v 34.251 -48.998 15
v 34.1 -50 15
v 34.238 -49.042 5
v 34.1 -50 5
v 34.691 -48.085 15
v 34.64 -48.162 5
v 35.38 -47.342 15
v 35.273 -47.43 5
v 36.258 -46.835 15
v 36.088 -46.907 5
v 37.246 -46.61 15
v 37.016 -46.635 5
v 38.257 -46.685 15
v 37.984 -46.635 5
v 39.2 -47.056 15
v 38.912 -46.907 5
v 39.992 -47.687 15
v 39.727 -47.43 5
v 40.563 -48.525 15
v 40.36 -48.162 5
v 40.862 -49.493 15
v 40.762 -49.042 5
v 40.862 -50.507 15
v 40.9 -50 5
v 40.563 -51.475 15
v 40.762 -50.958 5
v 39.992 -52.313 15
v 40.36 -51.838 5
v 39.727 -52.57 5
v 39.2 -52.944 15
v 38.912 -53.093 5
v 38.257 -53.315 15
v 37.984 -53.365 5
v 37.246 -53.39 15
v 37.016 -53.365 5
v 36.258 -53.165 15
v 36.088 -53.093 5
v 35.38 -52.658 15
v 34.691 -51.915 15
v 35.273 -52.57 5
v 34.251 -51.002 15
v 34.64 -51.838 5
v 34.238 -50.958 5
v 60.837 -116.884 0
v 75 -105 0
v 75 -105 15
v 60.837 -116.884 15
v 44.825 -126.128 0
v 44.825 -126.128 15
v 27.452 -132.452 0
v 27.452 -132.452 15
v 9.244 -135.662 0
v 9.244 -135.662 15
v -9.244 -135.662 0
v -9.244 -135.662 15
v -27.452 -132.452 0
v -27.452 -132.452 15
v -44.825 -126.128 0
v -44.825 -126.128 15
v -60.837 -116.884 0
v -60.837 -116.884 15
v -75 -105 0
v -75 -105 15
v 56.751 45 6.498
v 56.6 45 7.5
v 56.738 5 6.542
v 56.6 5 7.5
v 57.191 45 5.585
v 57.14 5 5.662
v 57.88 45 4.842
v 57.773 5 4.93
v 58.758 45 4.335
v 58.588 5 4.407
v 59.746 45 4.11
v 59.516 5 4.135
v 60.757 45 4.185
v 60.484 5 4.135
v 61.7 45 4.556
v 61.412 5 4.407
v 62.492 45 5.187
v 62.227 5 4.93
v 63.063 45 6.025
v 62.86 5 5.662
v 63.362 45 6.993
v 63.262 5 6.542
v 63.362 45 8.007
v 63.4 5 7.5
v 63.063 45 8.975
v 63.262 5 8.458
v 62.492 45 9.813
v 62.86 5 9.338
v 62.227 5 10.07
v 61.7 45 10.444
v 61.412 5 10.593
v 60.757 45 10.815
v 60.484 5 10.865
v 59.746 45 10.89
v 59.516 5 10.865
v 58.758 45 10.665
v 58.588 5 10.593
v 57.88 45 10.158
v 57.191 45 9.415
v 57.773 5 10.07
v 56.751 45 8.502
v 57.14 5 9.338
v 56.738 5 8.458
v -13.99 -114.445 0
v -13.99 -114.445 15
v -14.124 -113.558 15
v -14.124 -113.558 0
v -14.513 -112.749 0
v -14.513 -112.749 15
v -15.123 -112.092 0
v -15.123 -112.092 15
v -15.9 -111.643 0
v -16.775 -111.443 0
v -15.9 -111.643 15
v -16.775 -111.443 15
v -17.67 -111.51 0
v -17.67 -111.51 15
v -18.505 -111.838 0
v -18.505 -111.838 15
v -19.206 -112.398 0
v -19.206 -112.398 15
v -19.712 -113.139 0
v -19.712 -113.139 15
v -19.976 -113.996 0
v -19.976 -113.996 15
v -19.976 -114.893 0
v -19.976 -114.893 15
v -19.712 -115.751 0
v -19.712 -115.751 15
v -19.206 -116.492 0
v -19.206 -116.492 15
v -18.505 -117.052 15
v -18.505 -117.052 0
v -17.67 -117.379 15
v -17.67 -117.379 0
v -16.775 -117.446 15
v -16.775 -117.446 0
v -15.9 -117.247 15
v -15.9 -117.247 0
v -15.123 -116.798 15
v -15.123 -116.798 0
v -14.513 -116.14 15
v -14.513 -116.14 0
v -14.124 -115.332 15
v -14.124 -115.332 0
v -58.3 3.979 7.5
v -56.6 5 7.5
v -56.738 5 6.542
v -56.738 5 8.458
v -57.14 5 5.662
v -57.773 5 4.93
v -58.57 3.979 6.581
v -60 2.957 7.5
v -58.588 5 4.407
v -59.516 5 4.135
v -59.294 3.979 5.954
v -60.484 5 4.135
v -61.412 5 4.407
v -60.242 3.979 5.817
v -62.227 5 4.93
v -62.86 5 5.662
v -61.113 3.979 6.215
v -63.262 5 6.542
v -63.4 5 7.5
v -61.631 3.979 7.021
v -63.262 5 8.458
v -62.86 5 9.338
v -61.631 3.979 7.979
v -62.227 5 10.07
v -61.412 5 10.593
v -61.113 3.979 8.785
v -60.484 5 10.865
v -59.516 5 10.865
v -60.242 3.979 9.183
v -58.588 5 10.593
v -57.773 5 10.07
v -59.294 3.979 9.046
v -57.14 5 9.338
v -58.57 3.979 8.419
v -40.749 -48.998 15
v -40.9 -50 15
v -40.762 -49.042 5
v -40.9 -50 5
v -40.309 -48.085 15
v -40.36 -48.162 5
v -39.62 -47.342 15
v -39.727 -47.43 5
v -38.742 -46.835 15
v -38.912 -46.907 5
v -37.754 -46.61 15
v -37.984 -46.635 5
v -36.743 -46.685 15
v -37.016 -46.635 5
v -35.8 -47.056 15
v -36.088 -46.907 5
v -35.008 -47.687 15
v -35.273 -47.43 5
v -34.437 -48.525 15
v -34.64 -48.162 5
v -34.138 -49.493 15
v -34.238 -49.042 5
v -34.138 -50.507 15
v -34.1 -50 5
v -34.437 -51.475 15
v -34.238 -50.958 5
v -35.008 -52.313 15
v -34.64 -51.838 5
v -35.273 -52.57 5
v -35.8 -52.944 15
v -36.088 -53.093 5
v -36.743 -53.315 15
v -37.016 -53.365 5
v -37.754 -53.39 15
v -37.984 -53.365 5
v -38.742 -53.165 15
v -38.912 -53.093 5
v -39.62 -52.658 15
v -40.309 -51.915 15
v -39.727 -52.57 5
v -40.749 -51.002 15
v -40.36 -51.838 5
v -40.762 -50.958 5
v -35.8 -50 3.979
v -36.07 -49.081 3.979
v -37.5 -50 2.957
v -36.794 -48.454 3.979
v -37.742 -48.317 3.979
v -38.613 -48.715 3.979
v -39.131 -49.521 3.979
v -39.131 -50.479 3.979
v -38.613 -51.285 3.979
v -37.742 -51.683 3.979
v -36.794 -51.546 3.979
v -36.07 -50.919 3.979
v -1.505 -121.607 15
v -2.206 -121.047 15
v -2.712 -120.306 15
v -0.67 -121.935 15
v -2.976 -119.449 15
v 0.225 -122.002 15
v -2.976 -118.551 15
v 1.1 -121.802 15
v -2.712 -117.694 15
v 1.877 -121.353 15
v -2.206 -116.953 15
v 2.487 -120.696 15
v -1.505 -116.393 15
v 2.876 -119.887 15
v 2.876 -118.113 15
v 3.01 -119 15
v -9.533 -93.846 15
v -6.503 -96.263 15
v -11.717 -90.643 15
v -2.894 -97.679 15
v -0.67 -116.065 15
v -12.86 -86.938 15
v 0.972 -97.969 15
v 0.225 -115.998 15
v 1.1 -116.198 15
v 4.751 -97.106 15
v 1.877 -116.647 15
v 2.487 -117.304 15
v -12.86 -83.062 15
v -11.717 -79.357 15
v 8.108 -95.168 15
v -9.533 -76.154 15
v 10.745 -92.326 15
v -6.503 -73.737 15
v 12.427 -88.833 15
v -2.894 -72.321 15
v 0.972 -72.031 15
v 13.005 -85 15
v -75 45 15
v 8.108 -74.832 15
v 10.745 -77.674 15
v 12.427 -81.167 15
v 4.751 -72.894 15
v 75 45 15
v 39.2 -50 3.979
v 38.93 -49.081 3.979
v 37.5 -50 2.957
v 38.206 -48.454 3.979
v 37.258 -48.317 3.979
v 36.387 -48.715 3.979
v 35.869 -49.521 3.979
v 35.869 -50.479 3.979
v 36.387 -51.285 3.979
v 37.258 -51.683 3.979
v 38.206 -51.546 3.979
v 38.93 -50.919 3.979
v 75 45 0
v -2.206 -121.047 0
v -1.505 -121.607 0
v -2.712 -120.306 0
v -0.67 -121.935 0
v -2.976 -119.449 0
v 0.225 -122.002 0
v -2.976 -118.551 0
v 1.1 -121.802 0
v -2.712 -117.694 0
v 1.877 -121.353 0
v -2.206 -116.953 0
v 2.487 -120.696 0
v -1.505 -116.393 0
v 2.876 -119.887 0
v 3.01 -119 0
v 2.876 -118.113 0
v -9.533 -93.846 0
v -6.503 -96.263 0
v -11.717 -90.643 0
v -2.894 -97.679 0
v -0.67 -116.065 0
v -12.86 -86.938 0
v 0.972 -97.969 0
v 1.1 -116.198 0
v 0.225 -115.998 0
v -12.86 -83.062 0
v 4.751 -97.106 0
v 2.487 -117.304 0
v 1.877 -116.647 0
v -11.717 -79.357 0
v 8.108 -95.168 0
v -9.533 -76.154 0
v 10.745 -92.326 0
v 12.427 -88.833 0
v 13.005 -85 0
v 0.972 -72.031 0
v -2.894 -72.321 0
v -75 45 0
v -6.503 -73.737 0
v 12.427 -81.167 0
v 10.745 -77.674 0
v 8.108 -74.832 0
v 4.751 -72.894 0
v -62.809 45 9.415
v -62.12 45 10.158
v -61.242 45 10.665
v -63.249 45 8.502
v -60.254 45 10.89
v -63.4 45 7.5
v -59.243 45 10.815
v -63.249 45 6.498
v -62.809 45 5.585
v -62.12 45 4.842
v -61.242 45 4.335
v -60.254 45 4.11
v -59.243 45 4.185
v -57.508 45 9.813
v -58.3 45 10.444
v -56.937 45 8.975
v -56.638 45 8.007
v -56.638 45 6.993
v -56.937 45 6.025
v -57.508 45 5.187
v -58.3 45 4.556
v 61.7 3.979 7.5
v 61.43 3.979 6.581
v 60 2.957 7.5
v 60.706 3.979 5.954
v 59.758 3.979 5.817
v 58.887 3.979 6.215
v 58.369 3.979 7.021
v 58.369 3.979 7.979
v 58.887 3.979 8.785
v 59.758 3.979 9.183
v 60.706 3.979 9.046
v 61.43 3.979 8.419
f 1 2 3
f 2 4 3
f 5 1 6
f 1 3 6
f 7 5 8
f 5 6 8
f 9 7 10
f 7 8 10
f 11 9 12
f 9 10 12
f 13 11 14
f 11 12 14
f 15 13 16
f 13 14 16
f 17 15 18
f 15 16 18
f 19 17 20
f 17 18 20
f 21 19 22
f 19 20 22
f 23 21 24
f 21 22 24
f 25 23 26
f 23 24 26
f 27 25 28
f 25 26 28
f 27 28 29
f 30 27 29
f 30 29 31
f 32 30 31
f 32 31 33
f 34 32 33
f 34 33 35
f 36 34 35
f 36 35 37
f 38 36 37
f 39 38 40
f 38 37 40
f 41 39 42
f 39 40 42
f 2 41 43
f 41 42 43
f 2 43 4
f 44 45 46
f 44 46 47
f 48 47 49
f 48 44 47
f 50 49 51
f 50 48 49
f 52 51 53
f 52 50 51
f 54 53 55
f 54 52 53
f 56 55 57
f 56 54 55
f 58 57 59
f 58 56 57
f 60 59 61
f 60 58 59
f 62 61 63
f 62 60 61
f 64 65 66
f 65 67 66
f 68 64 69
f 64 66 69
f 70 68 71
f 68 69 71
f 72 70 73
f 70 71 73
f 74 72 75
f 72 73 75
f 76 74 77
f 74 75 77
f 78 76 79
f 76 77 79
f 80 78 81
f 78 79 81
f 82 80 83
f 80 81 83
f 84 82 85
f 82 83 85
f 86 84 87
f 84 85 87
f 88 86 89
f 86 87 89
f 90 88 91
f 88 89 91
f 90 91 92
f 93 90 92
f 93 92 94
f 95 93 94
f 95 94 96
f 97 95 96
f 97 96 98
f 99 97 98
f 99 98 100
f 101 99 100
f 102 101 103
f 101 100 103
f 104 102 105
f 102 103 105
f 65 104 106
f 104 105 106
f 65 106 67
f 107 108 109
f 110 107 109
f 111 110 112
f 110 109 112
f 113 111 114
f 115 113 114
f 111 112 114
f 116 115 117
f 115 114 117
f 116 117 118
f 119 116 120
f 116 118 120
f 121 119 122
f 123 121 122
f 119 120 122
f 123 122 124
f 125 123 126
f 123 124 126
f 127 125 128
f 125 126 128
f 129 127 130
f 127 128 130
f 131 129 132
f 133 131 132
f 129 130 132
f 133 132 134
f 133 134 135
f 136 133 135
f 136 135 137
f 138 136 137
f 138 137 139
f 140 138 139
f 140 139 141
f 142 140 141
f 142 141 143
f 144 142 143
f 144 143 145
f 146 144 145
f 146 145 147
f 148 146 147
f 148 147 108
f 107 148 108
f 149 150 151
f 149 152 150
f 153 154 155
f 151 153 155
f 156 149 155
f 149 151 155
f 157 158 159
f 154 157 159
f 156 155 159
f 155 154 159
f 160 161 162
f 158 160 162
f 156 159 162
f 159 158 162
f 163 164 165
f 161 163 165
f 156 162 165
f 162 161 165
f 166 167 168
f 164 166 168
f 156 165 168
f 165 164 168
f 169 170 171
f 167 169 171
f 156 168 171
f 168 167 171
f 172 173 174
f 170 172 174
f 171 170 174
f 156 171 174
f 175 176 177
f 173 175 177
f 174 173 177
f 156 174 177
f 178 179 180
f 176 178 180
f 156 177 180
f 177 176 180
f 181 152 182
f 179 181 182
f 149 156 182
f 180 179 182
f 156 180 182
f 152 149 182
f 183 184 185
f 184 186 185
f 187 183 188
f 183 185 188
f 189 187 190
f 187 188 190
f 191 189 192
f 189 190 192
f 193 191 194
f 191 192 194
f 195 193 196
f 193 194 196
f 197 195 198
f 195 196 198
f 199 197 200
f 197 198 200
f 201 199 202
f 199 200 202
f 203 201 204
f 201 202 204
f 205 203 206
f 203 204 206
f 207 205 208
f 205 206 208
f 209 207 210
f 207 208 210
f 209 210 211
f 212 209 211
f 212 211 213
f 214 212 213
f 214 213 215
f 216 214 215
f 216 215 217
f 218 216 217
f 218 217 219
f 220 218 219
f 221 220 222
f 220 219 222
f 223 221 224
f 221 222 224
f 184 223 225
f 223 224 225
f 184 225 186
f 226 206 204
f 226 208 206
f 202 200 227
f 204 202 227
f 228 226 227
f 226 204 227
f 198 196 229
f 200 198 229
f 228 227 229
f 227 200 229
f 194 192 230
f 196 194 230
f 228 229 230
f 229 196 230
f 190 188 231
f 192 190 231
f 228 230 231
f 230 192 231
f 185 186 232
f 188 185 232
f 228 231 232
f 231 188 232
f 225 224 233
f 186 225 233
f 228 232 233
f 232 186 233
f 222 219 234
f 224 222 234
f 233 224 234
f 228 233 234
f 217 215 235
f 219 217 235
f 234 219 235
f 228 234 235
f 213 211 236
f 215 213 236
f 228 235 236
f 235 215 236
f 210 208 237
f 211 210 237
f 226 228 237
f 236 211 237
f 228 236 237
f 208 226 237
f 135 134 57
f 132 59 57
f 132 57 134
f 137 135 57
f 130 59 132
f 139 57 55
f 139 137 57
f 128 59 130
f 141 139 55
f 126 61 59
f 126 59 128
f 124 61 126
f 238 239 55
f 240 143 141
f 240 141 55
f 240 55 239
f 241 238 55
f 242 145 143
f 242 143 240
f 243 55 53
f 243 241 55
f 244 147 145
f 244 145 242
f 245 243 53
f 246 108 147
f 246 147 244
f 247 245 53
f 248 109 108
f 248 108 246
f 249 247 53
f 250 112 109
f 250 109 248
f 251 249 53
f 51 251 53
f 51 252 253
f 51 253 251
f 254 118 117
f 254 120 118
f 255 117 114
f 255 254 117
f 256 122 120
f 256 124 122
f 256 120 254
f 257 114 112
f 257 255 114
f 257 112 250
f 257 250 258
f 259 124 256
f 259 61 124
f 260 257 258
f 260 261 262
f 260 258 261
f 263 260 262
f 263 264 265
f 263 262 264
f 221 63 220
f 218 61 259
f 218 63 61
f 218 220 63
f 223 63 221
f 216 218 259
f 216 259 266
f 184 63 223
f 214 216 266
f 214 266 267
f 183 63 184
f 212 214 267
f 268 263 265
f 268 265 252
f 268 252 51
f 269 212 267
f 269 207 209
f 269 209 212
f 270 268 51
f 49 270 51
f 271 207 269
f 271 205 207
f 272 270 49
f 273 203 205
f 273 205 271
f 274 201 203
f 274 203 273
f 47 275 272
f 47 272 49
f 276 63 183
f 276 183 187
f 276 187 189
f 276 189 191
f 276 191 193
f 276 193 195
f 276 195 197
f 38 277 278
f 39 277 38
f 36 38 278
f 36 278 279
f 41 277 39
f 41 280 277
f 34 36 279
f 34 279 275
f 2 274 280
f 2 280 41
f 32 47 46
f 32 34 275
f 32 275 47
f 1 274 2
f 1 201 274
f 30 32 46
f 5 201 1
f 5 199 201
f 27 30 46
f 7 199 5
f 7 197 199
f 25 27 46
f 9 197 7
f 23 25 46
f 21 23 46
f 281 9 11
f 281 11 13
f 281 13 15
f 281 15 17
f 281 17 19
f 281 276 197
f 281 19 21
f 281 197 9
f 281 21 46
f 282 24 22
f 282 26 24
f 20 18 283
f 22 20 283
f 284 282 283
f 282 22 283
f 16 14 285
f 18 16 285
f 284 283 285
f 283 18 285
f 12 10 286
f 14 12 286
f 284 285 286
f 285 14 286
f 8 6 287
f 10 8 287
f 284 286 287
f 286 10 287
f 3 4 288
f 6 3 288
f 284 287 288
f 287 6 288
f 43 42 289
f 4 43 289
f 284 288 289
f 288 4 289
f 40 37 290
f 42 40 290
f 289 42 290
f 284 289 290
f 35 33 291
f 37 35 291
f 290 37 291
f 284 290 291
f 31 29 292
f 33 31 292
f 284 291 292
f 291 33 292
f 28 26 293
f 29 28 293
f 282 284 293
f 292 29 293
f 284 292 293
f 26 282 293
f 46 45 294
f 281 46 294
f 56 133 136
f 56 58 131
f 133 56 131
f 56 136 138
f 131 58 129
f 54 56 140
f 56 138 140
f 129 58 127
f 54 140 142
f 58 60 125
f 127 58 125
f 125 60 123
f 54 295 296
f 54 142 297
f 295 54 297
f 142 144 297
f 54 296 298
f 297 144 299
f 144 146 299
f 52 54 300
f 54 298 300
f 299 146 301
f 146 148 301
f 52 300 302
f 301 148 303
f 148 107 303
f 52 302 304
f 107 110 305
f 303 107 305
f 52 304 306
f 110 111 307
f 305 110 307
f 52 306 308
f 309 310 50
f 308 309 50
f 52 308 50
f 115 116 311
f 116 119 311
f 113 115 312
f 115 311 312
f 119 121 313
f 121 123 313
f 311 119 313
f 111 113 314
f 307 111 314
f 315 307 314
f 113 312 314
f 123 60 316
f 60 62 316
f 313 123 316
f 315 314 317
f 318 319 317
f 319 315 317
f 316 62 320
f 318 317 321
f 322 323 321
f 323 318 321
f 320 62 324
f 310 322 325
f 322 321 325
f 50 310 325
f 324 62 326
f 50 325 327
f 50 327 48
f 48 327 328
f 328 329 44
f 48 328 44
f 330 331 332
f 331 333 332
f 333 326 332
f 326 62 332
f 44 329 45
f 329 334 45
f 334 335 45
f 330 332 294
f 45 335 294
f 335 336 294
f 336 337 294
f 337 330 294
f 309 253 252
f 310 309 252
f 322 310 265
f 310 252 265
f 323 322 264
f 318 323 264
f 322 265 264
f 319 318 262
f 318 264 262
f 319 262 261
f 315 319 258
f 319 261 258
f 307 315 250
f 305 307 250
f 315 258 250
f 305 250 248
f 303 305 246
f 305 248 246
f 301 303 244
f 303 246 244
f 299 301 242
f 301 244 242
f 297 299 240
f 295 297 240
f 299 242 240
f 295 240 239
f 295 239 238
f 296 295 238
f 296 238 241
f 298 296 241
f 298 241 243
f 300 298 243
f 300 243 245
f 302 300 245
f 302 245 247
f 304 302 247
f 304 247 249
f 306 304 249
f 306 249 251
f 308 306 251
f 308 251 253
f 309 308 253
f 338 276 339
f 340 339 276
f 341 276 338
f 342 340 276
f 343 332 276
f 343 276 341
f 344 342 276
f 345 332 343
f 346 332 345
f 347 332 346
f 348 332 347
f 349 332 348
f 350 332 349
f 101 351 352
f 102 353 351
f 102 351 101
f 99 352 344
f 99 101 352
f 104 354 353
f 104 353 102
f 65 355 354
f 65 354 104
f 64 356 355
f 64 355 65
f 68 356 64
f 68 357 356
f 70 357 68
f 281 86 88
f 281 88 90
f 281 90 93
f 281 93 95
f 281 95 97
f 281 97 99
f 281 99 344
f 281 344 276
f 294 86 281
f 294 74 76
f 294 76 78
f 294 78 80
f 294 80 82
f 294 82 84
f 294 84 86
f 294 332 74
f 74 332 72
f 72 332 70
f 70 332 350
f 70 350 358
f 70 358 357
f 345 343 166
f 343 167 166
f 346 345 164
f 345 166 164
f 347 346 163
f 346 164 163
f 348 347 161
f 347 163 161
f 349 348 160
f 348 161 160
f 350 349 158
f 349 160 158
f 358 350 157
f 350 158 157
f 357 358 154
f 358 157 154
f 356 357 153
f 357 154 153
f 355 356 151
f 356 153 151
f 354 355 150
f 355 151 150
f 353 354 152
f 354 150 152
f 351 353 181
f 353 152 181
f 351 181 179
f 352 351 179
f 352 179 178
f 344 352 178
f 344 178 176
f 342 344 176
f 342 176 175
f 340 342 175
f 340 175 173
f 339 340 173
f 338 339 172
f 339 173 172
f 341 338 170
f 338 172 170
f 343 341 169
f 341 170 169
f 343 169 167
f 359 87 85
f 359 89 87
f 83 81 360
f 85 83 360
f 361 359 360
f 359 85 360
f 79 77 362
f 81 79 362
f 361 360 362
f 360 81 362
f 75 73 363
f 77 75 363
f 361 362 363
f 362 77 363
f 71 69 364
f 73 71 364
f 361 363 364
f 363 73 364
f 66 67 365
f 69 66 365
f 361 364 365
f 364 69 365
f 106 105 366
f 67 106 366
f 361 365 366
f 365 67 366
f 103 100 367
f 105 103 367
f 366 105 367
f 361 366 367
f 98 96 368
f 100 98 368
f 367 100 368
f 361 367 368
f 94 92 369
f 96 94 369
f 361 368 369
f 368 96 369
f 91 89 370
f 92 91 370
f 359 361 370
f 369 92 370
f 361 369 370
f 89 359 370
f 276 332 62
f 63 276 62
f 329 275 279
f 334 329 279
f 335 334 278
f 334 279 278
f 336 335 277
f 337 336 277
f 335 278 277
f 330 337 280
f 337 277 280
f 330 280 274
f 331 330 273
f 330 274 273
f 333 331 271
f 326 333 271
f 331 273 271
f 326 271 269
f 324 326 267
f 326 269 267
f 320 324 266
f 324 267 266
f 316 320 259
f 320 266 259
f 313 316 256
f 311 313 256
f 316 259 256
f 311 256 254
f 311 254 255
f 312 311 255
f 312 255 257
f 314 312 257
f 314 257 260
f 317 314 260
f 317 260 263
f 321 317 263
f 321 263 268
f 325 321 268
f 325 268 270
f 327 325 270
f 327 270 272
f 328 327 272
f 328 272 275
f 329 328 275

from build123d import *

# Parameters (mm, degrees)
SKETCH2_W                        = 150
SKETCH2_H                        = 90
SKETCH2_H_2                      = 60
BOSS_EXTRUDE1_DEPTH              = 15
SKETCH3_R                        = 13.005
SKETCH3_R_2                      = 3.01
CUT_EXTRUDE1_DEPTH               = 16
TAP_DRILL_FOR_M8X1_25_TAP2_D     = 6.8
TAP_DRILL_FOR_M8X1_25_TAP2_DEPTH = 10
TAP_DRILL_FOR_M8X1_25_TAP2_TIP   = 2.042926105
TAP_DRILL_FOR_M8X1_25_TAP3_D     = 6.8
TAP_DRILL_FOR_M8X1_25_TAP3_DEPTH = 40
TAP_DRILL_FOR_M8X1_25_TAP3_TIP   = 2.042926105


with BuildPart() as part:
    # Sketch2 → Boss-Extrude1 (new body)
    with BuildSketch(Plane.XY):
        Rectangle(SKETCH2_W, SKETCH2_H)
        with Locations((0, -75)):
            Rectangle(SKETCH2_W, SKETCH2_H_2)
        with BuildLine():
            Line((-75, -105), (75, -105))
            ThreePointArc((75, -105), (0, -136.066017178), (-75, -105))
        make_face()
    extrude(amount=BOSS_EXTRUDE1_DEPTH)

    # Sketch3 → Cut-Extrude1 (cut, through all)
    with BuildSketch(Plane.XY.offset(15)):
        with Locations((0, -85)):
            Circle(SKETCH3_R)
        with Locations((-17, -114.444863729)):
            Circle(SKETCH3_R_2)
        with Locations((0, -119)):
            Circle(SKETCH3_R_2)
    extrude(amount=-CUT_EXTRUDE1_DEPTH, mode=Mode.SUBTRACT)

    # Tap Drill for M8x1.25 Tap2
    with Locations(Plane.XY.offset(15)):
        with Locations((-37.5, -50), (37.5, -50)):
            Hole(TAP_DRILL_FOR_M8X1_25_TAP2_D / 2, depth=TAP_DRILL_FOR_M8X1_25_TAP2_DEPTH)
            with Locations((0, 0, -(TAP_DRILL_FOR_M8X1_25_TAP2_DEPTH + TAP_DRILL_FOR_M8X1_25_TAP2_TIP / 2))):  # 118° drill point
                Cone(0, TAP_DRILL_FOR_M8X1_25_TAP2_D / 2, TAP_DRILL_FOR_M8X1_25_TAP2_TIP, mode=Mode.SUBTRACT)

    # Tap Drill for M8x1.25 Tap3
    with Locations(Plane(origin=(0, 45, 0), x_dir=(1, 0, 0), z_dir=(0, 1, 0))):
        with Locations((-60, -7.5), (60, -7.5)):
            Hole(TAP_DRILL_FOR_M8X1_25_TAP3_D / 2, depth=TAP_DRILL_FOR_M8X1_25_TAP3_DEPTH)
            with Locations((0, 0, -(TAP_DRILL_FOR_M8X1_25_TAP3_DEPTH + TAP_DRILL_FOR_M8X1_25_TAP3_TIP / 2))):  # 118° drill point
                Cone(0, TAP_DRILL_FOR_M8X1_25_TAP3_D / 2, TAP_DRILL_FOR_M8X1_25_TAP3_TIP, mode=Mode.SUBTRACT)


solid = part.part
